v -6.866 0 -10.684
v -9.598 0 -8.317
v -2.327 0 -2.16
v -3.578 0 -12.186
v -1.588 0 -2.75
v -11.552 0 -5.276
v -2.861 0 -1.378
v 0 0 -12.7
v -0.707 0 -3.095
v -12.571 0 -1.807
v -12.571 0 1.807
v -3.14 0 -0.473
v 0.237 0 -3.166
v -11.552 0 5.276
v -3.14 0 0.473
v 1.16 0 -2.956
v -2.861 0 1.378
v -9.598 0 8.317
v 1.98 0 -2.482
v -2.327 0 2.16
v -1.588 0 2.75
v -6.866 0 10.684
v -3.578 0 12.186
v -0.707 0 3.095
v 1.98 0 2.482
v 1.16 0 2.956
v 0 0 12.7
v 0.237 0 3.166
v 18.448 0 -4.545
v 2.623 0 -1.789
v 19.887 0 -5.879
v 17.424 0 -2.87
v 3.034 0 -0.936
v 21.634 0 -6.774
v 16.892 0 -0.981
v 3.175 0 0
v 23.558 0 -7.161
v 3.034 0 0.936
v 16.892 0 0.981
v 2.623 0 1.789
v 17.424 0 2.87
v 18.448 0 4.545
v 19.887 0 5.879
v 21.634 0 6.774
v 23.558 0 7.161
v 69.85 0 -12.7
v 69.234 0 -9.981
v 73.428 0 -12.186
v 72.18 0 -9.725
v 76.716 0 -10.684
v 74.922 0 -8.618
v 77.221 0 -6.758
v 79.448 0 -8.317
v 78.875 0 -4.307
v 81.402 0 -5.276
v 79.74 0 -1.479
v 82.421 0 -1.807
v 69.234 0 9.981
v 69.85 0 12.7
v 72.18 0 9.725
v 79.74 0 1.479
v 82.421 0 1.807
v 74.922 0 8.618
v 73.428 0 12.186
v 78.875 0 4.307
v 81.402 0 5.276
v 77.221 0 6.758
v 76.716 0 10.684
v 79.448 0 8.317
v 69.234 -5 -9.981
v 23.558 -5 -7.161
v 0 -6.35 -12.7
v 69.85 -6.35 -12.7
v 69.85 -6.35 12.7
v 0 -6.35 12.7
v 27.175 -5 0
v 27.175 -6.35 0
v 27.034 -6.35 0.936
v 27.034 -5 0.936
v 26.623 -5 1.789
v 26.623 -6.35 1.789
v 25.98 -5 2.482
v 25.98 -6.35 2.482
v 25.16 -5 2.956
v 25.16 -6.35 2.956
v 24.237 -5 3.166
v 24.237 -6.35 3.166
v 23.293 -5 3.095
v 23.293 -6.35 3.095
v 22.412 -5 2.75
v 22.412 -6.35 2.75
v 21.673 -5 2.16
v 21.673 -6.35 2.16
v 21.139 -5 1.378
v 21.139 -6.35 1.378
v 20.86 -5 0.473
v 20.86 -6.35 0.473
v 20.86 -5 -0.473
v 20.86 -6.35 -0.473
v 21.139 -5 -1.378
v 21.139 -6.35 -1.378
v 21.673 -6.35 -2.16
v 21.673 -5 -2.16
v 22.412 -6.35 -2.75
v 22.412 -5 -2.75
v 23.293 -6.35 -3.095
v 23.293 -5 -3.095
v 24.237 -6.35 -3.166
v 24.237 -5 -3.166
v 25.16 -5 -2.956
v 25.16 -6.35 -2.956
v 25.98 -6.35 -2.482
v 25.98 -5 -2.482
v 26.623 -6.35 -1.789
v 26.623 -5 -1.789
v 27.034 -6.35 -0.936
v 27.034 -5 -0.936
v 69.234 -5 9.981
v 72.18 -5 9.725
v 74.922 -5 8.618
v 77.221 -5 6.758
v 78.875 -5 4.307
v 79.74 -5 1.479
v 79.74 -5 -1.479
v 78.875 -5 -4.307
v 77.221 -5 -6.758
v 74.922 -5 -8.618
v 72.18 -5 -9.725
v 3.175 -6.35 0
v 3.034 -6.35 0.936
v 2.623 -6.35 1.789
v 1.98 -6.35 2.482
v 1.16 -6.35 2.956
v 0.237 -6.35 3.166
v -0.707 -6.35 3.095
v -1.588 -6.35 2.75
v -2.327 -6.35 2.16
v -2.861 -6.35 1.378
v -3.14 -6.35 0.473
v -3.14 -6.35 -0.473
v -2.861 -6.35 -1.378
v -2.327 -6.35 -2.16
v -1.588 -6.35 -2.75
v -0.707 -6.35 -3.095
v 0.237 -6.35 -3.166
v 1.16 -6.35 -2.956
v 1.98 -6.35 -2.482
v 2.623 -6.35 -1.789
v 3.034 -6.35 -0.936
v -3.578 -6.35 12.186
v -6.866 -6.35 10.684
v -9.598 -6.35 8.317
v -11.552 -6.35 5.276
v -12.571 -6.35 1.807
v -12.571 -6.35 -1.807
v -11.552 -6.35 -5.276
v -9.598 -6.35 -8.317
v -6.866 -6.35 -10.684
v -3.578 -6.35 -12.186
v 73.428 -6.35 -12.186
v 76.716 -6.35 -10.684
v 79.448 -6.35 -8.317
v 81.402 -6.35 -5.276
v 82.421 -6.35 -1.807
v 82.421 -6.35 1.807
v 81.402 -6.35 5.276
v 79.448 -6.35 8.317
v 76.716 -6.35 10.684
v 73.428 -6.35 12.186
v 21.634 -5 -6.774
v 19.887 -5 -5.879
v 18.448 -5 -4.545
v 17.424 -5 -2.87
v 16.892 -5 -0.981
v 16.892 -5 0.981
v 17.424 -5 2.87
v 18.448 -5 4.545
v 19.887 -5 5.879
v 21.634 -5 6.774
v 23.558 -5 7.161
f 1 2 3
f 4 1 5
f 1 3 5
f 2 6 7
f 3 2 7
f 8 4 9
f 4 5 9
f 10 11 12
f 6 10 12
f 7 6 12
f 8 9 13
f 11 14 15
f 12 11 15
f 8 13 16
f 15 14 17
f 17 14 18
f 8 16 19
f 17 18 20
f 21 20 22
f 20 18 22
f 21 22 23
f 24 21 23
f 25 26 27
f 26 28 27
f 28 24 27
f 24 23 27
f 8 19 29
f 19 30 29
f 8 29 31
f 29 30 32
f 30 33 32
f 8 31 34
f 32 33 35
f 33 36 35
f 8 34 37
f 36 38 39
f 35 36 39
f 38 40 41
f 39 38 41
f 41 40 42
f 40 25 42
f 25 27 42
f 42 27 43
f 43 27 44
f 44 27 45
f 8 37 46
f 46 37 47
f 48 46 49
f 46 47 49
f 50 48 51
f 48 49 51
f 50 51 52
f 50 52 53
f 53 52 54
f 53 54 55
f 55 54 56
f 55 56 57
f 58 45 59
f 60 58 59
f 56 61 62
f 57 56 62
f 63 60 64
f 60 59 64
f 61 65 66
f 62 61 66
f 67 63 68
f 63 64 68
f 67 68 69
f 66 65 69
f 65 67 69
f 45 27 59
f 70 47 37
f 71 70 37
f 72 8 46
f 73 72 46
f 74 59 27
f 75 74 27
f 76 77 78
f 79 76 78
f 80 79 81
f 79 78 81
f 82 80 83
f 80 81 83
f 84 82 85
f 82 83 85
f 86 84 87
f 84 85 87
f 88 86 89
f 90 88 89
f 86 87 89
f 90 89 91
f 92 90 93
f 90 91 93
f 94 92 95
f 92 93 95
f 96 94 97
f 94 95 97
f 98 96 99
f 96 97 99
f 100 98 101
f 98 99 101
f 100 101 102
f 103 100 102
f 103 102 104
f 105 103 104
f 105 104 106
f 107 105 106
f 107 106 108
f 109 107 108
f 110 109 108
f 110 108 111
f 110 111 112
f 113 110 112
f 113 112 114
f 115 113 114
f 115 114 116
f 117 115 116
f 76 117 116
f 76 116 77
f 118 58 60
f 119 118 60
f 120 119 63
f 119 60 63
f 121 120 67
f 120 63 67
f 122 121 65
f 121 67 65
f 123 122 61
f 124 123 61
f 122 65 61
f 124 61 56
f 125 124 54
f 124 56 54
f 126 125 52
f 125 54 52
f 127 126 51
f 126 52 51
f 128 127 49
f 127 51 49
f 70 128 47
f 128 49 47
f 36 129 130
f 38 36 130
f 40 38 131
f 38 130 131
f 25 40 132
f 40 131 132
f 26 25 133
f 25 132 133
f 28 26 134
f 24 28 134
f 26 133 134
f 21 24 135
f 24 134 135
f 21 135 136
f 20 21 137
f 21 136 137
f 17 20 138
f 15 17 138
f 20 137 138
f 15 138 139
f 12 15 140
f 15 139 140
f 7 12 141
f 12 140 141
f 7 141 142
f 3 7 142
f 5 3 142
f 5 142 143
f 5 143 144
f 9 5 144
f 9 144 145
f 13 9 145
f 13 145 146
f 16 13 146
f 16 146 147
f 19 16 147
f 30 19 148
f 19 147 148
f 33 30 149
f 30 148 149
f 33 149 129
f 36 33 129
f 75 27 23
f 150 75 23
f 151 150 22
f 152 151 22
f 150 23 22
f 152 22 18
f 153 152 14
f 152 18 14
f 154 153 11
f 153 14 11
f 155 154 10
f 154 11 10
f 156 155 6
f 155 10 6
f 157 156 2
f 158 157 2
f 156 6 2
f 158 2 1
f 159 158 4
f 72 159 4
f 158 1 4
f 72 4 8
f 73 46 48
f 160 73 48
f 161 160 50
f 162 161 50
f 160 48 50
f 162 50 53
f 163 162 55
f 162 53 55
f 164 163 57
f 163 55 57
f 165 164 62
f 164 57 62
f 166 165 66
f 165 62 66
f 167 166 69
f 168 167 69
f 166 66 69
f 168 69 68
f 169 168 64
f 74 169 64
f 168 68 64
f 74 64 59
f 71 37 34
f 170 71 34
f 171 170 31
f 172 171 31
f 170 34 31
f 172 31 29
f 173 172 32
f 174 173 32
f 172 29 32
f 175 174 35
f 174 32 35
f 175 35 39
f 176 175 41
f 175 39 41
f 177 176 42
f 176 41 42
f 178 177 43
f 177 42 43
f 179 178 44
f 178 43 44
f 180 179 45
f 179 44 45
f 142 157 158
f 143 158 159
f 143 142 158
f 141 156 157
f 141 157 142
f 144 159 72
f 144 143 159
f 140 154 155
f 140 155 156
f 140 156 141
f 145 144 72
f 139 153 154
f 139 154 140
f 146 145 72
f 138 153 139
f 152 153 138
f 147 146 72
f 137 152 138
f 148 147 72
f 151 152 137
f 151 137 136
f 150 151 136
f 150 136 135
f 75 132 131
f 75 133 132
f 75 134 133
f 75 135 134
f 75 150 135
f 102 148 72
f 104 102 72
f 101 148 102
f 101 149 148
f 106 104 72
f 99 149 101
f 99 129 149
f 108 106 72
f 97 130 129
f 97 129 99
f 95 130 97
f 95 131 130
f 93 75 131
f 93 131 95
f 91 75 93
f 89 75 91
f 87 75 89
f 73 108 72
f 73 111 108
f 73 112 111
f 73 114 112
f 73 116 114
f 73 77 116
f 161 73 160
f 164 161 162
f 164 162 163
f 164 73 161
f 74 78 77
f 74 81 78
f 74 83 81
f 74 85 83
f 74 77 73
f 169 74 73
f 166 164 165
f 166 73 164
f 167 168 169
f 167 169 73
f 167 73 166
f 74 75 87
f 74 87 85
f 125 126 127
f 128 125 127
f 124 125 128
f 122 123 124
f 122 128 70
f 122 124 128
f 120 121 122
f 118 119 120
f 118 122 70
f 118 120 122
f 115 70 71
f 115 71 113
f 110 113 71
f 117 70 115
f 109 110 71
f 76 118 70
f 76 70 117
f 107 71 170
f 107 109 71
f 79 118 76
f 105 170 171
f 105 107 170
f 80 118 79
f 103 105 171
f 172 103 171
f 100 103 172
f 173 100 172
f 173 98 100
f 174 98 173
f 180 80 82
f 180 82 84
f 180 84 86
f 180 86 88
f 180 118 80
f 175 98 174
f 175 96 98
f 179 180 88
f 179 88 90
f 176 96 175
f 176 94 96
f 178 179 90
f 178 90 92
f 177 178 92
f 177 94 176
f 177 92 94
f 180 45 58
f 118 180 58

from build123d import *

# Parameters (mm, degrees)
F1_DEPTH = 6.35
F2_R     = 3.175
F3_DEPTH = 6.35
F5_DEPTH = 5


with BuildPart() as f1:
    # F0 (on Front) → F1 (new body)
    with BuildSketch(Plane.XZ):
        with BuildLine():
            Line((69.85, 12.7), (0, 12.7))
            ThreePointArc((0, 12.7), (-12.7, 0), (0, -12.7))
            Line((0, -12.7), (69.85, -12.7))
            ThreePointArc((69.85, -12.7), (82.55, 0), (69.85, 12.7))
        make_face()
    extrude(amount=F1_DEPTH)

    # F2 (on face) → F3 (cut, through all)
    with BuildSketch(Plane.XZ.offset(6.35)):
        Circle(F2_R)
        with Locations((24, 0)):
            Circle(F2_R)
    extrude(amount=-F3_DEPTH, mode=Mode.SUBTRACT)

    # F4 (on face) → F5 (cut)
    with BuildSketch(Plane(origin=(0, 0, 0), x_dir=(-1, 0, 0), z_dir=(0, 1, 0))):
        with BuildLine():
            Line((-23.55792, 7.161368), (-69.23386, 9.981001))
            ThreePointArc((-69.23386, 9.981001), (-79.85, 0), (-69.23386, -9.981001))
            Line((-69.23386, -9.981001), (-23.55792, -7.161368))
            ThreePointArc((-23.55792, -7.161368), (-16.825, 0), (-23.55792, 7.161368))
        make_face()
    extrude(amount=-F5_DEPTH, mode=Mode.SUBTRACT)


solid = f1.part
